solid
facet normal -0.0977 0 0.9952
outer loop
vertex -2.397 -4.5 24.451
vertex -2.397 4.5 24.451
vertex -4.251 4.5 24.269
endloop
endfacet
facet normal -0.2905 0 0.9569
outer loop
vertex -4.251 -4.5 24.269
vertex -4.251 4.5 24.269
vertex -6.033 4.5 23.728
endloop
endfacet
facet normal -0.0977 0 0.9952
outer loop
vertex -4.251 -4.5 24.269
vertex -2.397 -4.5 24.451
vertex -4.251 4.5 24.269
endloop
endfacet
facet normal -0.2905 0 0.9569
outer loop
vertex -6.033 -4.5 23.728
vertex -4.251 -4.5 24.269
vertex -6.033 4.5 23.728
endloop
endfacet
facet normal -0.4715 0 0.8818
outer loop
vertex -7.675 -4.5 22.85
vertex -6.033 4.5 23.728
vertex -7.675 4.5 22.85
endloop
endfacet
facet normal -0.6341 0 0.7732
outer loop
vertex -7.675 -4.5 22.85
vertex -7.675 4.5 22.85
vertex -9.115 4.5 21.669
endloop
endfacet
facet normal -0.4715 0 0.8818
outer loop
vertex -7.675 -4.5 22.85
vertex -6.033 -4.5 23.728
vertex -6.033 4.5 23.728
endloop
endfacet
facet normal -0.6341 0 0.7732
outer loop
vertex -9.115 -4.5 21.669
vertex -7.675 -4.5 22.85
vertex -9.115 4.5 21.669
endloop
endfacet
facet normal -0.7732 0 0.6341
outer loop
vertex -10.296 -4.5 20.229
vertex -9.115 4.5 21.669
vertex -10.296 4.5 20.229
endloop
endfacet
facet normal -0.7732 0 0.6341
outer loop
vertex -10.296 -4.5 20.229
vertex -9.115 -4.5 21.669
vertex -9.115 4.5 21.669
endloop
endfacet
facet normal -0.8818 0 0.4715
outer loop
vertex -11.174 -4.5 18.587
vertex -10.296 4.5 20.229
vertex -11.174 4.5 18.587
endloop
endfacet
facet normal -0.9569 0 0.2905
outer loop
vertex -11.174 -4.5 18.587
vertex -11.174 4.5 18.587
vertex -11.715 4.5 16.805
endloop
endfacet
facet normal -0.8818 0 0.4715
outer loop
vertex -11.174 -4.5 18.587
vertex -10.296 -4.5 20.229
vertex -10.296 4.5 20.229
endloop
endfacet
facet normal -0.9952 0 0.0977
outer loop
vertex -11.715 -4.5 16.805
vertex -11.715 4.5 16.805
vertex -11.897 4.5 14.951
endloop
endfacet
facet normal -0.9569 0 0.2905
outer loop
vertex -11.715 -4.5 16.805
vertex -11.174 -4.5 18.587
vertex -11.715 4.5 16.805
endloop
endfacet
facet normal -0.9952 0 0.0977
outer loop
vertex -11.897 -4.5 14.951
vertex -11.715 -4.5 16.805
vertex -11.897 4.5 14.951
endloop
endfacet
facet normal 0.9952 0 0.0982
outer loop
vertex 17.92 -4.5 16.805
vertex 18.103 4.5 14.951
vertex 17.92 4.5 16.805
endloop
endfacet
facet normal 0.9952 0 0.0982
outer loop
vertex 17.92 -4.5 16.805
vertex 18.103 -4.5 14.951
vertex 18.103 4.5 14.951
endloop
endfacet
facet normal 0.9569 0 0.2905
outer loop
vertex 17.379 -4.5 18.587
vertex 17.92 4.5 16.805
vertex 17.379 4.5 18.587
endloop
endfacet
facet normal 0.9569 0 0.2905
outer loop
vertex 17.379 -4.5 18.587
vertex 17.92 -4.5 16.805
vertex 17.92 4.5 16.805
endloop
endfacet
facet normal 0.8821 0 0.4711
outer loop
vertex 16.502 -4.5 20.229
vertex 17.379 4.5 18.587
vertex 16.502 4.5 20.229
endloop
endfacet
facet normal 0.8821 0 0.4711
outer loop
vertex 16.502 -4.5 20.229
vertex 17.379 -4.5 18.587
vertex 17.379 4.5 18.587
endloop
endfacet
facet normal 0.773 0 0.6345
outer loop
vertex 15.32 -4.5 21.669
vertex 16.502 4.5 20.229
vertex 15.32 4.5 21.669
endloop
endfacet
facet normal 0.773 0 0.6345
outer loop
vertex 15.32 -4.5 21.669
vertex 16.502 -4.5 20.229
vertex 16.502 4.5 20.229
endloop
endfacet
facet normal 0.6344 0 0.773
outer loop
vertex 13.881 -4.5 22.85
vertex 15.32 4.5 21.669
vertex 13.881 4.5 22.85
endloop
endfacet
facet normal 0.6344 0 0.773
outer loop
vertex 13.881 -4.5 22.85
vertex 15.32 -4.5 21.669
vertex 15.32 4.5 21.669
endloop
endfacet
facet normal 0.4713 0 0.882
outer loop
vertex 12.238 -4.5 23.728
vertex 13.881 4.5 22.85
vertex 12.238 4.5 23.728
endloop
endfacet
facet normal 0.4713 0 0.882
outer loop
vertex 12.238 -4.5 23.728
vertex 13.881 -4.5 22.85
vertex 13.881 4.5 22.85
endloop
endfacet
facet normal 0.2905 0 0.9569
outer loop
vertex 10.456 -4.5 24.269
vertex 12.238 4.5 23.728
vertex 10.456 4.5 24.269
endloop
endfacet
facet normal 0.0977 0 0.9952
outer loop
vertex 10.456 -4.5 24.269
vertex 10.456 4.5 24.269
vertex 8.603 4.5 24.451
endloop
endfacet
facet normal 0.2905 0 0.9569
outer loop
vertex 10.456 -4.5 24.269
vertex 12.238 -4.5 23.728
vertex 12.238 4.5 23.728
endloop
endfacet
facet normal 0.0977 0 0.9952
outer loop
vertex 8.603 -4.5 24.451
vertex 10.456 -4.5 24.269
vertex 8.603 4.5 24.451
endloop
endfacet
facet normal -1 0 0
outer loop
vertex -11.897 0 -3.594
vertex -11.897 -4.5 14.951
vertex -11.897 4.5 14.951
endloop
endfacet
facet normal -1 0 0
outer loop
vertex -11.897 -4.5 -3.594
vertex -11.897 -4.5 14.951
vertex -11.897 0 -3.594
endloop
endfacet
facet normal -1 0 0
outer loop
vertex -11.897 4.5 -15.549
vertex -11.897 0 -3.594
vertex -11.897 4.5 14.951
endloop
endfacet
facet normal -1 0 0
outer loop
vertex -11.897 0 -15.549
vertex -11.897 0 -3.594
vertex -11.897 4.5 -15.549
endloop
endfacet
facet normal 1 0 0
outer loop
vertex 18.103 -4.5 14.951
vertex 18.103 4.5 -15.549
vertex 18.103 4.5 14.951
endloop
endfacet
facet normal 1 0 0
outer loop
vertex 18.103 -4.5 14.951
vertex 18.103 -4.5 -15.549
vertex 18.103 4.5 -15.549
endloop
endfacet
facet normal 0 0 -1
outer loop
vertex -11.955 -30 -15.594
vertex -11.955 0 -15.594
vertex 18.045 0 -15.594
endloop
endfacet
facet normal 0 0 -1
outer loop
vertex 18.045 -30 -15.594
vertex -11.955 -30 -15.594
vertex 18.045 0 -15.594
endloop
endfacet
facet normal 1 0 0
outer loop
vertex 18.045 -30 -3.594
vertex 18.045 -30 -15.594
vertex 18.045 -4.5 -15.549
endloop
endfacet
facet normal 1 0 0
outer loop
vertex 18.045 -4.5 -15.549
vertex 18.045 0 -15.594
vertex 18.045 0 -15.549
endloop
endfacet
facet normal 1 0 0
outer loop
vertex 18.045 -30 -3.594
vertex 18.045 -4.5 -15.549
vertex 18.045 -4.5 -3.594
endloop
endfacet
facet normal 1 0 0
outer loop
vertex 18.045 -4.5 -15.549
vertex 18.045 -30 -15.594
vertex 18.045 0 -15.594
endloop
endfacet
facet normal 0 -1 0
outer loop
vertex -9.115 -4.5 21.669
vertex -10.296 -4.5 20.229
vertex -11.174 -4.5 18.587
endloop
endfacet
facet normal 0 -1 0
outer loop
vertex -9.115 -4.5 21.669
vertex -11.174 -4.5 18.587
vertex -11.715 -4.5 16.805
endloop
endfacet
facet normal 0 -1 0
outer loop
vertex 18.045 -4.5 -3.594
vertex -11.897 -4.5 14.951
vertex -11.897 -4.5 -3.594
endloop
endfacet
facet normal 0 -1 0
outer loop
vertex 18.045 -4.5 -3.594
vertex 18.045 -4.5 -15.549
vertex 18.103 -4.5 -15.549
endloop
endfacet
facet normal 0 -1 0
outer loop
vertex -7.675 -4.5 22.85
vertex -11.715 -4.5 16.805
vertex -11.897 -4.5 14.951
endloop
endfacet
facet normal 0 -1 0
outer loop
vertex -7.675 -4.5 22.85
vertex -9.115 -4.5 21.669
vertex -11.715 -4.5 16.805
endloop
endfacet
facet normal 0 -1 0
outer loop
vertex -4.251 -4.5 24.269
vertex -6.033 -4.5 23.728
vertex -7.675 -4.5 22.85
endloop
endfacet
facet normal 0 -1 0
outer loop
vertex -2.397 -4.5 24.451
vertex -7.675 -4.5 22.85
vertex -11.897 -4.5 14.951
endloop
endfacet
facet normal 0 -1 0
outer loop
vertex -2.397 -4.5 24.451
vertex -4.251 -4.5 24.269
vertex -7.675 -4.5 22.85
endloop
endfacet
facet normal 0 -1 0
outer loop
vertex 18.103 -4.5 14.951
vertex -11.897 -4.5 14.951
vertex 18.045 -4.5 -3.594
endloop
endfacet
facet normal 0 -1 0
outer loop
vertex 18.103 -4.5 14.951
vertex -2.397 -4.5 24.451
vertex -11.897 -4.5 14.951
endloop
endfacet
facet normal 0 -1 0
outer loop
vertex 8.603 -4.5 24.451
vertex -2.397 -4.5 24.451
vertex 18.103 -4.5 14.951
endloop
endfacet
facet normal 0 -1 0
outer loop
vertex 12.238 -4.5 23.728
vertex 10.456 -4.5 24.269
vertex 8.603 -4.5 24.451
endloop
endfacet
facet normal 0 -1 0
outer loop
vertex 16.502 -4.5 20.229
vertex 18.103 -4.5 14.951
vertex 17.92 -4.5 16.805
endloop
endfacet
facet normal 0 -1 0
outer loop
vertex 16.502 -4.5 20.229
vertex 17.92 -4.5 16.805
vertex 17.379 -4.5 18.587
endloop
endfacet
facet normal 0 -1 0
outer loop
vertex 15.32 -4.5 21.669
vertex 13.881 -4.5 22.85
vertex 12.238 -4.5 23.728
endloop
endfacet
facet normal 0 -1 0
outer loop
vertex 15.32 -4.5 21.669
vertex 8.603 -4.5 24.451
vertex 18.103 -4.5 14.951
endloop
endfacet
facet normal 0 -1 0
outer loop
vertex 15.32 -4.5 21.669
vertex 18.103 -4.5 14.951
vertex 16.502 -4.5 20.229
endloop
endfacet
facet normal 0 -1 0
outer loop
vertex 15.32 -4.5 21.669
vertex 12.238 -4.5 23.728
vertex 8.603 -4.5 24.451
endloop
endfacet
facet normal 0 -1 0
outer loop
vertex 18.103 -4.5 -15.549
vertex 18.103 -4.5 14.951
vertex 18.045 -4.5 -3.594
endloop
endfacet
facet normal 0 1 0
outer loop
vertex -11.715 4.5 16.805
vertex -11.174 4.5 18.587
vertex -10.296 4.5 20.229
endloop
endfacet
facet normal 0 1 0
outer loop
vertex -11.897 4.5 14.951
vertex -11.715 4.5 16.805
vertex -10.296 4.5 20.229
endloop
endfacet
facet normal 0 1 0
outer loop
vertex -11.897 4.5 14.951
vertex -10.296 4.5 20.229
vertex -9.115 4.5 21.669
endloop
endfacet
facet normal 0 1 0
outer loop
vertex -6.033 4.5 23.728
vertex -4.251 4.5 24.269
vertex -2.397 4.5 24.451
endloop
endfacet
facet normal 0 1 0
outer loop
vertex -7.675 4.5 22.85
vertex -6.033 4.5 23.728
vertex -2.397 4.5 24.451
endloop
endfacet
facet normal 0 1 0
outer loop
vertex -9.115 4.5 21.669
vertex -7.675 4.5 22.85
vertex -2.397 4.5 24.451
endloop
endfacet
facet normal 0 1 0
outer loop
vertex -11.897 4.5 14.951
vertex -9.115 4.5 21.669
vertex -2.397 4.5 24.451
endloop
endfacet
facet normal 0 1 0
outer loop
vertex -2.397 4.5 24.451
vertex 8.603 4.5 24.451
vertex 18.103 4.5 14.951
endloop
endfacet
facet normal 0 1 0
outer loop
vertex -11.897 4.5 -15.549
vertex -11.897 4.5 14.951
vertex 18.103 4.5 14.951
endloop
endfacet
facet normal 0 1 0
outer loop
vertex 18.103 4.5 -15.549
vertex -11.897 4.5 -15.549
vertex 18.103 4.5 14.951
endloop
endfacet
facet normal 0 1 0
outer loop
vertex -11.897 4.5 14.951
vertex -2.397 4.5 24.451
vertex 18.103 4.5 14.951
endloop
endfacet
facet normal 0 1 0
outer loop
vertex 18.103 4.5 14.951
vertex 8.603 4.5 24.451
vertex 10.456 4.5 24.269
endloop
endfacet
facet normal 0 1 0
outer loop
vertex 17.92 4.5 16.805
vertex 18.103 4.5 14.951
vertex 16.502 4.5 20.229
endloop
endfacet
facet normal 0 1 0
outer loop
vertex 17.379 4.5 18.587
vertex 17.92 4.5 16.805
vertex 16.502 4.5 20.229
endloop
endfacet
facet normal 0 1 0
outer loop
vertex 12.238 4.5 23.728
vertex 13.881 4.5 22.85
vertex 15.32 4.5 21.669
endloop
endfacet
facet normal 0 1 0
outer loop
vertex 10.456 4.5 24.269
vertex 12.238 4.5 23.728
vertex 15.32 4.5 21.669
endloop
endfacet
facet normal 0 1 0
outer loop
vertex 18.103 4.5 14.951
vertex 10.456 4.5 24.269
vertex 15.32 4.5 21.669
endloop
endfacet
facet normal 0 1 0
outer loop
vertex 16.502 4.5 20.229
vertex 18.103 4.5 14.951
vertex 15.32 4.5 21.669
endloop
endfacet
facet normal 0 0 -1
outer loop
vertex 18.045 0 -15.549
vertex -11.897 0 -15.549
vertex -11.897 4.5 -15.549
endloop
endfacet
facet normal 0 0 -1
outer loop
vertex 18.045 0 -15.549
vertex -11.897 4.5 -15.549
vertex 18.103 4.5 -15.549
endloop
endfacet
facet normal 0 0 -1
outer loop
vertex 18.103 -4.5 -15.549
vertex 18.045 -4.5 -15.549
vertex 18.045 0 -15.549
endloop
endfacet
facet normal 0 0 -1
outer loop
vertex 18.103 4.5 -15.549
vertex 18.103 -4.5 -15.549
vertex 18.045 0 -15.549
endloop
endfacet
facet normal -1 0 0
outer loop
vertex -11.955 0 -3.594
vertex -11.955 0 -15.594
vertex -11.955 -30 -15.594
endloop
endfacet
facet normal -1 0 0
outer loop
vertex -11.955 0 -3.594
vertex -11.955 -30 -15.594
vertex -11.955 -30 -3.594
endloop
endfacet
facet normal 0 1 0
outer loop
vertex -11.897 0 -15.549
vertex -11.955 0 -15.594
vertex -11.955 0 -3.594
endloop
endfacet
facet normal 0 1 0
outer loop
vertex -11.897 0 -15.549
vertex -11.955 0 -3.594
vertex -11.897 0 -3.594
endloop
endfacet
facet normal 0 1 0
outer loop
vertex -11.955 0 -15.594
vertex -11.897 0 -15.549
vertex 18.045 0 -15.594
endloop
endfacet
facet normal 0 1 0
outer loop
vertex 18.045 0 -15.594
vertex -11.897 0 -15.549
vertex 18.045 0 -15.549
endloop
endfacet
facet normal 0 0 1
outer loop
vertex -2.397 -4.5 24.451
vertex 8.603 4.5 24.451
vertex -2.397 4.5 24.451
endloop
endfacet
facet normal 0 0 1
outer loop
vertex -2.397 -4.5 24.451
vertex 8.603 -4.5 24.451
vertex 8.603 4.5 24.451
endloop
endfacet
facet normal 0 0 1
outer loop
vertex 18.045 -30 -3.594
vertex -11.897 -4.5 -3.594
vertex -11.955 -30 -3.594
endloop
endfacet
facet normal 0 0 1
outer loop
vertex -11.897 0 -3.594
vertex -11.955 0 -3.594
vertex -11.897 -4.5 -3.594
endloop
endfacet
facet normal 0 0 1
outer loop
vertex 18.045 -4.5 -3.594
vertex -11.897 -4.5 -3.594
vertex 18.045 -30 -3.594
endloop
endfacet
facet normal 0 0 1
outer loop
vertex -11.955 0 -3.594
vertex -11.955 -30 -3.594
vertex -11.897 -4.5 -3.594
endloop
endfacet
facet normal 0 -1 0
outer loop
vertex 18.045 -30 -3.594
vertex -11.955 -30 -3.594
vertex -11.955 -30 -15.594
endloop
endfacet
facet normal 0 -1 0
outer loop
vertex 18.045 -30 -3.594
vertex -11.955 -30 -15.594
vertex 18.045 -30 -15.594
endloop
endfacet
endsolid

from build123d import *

# Parameters (mm, degrees)
F0_W     = 30
F0_H     = 12
F1_DEPTH = 4.5
F2_W     = 30
F2_H     = 12
F3_DEPTH = 30


with BuildPart() as f1:
    # F0 (on Front) → F1 (new body, symmetric)
    with BuildSketch(Plane.XZ):
        with BuildLine():
            Line((8.60261, 24.451202), (-2.39739, 24.451202))
            ThreePointArc((-2.39739, 24.451202), (-9.114904, 21.668717), (-11.89739, 14.951202))
            Line((-11.89739, 14.951202), (-11.89739, -3.548798))
            Line((-11.89739, -3.548798), (18.10261, -3.548798))
            Line((18.10261, -3.548798), (18.10261, 14.951202))
            ThreePointArc((18.10261, 14.951202), (15.320125, 21.668717), (8.60261, 24.451202))
        make_face()
        with Locations((3.10261, -9.548798)):
            Rectangle(F0_W, F0_H)
    extrude(amount=F1_DEPTH, both=True)

    # F2 (on Front) → F3 (join)
    with BuildSketch(Plane.XZ):
        with Locations((3.045083, -9.593663)):
            Rectangle(F2_W, F2_H)
    extrude(amount=F3_DEPTH)


solid = f1.part
